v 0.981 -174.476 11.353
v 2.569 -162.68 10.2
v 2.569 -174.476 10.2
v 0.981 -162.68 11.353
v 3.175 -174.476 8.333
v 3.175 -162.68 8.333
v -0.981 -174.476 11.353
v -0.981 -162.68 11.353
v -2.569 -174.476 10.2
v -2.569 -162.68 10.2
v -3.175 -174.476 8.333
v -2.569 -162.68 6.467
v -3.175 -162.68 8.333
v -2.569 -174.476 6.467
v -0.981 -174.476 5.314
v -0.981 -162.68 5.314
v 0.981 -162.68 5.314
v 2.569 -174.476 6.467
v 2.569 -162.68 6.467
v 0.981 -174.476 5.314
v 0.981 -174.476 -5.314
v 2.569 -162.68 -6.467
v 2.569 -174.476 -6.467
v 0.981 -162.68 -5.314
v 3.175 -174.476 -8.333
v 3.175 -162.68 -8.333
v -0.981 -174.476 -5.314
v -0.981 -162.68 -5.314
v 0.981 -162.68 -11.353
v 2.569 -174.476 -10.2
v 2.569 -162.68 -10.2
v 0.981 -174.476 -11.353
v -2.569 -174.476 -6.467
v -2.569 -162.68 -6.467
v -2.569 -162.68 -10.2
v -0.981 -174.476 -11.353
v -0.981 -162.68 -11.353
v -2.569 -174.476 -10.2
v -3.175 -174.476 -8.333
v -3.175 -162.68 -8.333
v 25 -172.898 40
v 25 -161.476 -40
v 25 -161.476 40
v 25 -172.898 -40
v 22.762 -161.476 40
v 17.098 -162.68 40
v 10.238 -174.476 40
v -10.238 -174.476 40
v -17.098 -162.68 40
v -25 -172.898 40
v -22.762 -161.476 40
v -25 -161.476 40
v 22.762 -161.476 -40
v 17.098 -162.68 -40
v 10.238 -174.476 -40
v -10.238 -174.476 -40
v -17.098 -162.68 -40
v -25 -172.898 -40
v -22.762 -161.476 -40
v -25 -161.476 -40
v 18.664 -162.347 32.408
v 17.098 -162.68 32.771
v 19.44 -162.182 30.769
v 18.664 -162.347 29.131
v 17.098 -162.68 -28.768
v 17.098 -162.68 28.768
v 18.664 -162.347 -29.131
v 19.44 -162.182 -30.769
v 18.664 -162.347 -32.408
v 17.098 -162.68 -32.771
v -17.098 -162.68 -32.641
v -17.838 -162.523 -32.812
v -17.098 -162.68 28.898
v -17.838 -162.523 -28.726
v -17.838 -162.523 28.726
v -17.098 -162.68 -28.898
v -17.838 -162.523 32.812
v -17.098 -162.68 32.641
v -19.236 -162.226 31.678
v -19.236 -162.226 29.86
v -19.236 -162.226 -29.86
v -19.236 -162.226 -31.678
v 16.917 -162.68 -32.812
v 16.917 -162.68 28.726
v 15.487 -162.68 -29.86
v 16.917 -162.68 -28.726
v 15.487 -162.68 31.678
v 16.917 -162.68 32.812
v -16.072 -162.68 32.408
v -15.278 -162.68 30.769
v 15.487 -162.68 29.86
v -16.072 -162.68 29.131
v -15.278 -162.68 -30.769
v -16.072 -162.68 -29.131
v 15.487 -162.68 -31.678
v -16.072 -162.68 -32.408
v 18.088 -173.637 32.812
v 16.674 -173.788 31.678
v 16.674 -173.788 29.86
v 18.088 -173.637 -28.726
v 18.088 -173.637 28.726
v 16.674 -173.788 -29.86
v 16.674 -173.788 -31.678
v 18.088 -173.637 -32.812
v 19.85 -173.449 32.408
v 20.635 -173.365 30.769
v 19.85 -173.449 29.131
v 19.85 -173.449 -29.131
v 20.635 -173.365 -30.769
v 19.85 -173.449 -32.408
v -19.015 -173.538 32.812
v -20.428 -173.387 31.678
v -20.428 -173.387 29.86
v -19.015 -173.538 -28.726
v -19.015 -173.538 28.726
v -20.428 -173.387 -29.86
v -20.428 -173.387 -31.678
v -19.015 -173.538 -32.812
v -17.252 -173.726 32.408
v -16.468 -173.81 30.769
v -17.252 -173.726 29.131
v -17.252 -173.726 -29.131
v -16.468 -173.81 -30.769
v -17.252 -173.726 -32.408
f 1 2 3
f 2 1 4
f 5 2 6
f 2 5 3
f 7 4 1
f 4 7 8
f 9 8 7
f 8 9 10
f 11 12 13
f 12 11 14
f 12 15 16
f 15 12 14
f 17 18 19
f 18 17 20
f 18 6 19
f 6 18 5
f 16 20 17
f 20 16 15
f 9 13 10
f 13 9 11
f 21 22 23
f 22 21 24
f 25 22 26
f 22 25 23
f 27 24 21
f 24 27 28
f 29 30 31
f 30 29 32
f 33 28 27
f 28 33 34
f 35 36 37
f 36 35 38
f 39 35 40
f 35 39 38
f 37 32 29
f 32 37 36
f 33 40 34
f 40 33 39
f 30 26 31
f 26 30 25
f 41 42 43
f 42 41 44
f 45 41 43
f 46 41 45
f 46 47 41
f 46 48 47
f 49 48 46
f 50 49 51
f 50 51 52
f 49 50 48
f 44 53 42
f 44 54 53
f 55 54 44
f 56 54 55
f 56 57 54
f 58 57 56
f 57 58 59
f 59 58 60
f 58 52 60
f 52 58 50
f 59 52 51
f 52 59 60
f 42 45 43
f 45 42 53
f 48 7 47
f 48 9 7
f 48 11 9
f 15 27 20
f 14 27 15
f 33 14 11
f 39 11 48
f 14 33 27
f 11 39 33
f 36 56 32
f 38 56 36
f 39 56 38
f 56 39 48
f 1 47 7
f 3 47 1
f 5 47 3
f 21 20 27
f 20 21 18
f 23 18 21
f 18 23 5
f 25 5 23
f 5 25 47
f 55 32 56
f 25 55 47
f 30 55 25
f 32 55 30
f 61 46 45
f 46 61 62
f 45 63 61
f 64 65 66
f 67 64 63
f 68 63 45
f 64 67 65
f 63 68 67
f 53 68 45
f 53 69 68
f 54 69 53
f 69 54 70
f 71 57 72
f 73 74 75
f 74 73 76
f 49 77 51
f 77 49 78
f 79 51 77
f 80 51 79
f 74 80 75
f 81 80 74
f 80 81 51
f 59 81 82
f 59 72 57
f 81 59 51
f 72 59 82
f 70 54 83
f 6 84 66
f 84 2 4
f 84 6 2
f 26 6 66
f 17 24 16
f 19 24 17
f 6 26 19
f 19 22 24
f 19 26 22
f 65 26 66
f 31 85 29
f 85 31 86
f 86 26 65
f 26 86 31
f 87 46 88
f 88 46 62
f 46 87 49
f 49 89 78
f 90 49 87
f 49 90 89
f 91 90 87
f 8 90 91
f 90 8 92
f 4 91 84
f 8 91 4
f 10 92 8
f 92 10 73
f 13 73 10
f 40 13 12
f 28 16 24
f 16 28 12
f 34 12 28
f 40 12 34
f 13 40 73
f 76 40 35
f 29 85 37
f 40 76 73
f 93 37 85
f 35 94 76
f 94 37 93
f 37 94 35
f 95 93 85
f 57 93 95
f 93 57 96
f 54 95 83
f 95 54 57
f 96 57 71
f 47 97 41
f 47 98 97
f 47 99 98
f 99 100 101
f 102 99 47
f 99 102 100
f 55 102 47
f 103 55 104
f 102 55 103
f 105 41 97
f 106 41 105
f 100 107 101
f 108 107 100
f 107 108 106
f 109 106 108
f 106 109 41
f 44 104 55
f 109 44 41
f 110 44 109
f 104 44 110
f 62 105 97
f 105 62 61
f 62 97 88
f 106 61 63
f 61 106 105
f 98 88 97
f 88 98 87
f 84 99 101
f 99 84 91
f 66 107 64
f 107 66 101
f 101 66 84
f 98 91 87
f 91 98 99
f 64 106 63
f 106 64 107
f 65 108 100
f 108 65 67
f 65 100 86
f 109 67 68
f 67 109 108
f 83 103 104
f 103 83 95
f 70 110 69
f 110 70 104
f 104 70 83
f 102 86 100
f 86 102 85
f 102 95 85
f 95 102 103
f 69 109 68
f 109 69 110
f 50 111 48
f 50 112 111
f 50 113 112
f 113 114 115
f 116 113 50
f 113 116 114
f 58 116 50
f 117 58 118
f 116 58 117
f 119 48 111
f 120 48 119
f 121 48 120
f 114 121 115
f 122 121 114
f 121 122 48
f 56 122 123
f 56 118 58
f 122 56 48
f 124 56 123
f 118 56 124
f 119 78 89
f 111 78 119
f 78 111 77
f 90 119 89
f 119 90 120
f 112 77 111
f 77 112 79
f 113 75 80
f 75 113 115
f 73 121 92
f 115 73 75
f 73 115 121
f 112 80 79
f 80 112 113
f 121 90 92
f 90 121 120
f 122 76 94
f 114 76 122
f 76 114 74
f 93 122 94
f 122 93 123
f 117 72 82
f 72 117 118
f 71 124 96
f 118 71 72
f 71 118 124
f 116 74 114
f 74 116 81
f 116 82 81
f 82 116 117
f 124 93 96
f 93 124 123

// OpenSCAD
// Base for Spider by 
// 12/14/2020
// Visit erellaz.com for additional documentation and workflow

scale=25.4;    // Inch to mm

//body
hm=80; //heigth  mm
hm2=50;
spacer_width=50; //we need to allo for 2 1/4" screws, so a little over 1/2 thickness, ie over 12.7mm
spacer_thickness=13;
spacer_length=15;//the length of the spacer inside the telescope, used to separate the 1/4 holes only

tubeor=12.88*scale/2;

shift=2;
nbrholestele=2;

theta=6.1;

rhh=.25*scale/2;//for 1/4-20 no tapping
rhs=0.165*scale/2; // for 8-32 no tapping

//Resolution for STL export only. That is for display in Openscad and 3D printing only. 
//Please do comment this before going to Freecad, or you will end up with inefficient facets.
// and will not play well with export to .step files

//$fn=400;
// the 1/4 holes through the tube
module drill_holes_tele(hm,nbrholestele,spacer_length,rhh){
   spacing=hm/(nbrholestele*3);
    for(j = [0 : 1 : nbrholestele-1]){
     translate([0,0,(nbrholestele-1-2*j)*spacing]) rotate([90,0,0]) cylinder(h=spacer_length*2, r=rhh, center=true);
    }
}

module machine_corners(theta){
    rotate([0,0,theta])translate([0,(shift-tubeor-(3*spacer_thickness/2)),0])union(){
     cube(size = [spacer_width+20,spacer_thickness, hm+20], center = true);
     translate([0,0,hm/2.6]) rotate([90,0,0]) cylinder(h=spacer_length*4, r=rhs, center=true);
     translate([0,0,-hm/2.6]) rotate([90,0,0]) cylinder(h=spacer_length*4, r=rhs, center=true);
     }
}


//_________________________________________________________________________________
//main body
difference(){
difference(){
translate([0,(-tubeor+.1+shift-spacer_thickness/2),0])cube(size = [spacer_width,spacer_thickness, hm], center = true);
cylinder(h=hm*2, r=tubeor, center=true);
translate([0,(-tubeor+shift-spacer_thickness/2),0])drill_holes_tele(hm2,nbrholestele,spacer_length,rhh);
}

union(){
  machine_corners(theta);
  machine_corners(-theta);
}

}
//_________________________________________________________________________________

//testing the cylinder
if(0){
  color( "red" ) {
     rotate([0,0,theta])translate([0,(shift-tubeor-(3*spacer_thickness/2)),0])union(){
     cube(size = [spacer_width+20,spacer_thickness, hm+20], center = true);
     translate([0,0,hm/3]) rotate([90,0,0]) cylinder(h=spacer_length*4, r=rhs, center=true);
     translate([0,0,-hm/3]) rotate([90,0,0]) cylinder(h=spacer_length*4, r=rhs, center=true);
     }
      }
  }
